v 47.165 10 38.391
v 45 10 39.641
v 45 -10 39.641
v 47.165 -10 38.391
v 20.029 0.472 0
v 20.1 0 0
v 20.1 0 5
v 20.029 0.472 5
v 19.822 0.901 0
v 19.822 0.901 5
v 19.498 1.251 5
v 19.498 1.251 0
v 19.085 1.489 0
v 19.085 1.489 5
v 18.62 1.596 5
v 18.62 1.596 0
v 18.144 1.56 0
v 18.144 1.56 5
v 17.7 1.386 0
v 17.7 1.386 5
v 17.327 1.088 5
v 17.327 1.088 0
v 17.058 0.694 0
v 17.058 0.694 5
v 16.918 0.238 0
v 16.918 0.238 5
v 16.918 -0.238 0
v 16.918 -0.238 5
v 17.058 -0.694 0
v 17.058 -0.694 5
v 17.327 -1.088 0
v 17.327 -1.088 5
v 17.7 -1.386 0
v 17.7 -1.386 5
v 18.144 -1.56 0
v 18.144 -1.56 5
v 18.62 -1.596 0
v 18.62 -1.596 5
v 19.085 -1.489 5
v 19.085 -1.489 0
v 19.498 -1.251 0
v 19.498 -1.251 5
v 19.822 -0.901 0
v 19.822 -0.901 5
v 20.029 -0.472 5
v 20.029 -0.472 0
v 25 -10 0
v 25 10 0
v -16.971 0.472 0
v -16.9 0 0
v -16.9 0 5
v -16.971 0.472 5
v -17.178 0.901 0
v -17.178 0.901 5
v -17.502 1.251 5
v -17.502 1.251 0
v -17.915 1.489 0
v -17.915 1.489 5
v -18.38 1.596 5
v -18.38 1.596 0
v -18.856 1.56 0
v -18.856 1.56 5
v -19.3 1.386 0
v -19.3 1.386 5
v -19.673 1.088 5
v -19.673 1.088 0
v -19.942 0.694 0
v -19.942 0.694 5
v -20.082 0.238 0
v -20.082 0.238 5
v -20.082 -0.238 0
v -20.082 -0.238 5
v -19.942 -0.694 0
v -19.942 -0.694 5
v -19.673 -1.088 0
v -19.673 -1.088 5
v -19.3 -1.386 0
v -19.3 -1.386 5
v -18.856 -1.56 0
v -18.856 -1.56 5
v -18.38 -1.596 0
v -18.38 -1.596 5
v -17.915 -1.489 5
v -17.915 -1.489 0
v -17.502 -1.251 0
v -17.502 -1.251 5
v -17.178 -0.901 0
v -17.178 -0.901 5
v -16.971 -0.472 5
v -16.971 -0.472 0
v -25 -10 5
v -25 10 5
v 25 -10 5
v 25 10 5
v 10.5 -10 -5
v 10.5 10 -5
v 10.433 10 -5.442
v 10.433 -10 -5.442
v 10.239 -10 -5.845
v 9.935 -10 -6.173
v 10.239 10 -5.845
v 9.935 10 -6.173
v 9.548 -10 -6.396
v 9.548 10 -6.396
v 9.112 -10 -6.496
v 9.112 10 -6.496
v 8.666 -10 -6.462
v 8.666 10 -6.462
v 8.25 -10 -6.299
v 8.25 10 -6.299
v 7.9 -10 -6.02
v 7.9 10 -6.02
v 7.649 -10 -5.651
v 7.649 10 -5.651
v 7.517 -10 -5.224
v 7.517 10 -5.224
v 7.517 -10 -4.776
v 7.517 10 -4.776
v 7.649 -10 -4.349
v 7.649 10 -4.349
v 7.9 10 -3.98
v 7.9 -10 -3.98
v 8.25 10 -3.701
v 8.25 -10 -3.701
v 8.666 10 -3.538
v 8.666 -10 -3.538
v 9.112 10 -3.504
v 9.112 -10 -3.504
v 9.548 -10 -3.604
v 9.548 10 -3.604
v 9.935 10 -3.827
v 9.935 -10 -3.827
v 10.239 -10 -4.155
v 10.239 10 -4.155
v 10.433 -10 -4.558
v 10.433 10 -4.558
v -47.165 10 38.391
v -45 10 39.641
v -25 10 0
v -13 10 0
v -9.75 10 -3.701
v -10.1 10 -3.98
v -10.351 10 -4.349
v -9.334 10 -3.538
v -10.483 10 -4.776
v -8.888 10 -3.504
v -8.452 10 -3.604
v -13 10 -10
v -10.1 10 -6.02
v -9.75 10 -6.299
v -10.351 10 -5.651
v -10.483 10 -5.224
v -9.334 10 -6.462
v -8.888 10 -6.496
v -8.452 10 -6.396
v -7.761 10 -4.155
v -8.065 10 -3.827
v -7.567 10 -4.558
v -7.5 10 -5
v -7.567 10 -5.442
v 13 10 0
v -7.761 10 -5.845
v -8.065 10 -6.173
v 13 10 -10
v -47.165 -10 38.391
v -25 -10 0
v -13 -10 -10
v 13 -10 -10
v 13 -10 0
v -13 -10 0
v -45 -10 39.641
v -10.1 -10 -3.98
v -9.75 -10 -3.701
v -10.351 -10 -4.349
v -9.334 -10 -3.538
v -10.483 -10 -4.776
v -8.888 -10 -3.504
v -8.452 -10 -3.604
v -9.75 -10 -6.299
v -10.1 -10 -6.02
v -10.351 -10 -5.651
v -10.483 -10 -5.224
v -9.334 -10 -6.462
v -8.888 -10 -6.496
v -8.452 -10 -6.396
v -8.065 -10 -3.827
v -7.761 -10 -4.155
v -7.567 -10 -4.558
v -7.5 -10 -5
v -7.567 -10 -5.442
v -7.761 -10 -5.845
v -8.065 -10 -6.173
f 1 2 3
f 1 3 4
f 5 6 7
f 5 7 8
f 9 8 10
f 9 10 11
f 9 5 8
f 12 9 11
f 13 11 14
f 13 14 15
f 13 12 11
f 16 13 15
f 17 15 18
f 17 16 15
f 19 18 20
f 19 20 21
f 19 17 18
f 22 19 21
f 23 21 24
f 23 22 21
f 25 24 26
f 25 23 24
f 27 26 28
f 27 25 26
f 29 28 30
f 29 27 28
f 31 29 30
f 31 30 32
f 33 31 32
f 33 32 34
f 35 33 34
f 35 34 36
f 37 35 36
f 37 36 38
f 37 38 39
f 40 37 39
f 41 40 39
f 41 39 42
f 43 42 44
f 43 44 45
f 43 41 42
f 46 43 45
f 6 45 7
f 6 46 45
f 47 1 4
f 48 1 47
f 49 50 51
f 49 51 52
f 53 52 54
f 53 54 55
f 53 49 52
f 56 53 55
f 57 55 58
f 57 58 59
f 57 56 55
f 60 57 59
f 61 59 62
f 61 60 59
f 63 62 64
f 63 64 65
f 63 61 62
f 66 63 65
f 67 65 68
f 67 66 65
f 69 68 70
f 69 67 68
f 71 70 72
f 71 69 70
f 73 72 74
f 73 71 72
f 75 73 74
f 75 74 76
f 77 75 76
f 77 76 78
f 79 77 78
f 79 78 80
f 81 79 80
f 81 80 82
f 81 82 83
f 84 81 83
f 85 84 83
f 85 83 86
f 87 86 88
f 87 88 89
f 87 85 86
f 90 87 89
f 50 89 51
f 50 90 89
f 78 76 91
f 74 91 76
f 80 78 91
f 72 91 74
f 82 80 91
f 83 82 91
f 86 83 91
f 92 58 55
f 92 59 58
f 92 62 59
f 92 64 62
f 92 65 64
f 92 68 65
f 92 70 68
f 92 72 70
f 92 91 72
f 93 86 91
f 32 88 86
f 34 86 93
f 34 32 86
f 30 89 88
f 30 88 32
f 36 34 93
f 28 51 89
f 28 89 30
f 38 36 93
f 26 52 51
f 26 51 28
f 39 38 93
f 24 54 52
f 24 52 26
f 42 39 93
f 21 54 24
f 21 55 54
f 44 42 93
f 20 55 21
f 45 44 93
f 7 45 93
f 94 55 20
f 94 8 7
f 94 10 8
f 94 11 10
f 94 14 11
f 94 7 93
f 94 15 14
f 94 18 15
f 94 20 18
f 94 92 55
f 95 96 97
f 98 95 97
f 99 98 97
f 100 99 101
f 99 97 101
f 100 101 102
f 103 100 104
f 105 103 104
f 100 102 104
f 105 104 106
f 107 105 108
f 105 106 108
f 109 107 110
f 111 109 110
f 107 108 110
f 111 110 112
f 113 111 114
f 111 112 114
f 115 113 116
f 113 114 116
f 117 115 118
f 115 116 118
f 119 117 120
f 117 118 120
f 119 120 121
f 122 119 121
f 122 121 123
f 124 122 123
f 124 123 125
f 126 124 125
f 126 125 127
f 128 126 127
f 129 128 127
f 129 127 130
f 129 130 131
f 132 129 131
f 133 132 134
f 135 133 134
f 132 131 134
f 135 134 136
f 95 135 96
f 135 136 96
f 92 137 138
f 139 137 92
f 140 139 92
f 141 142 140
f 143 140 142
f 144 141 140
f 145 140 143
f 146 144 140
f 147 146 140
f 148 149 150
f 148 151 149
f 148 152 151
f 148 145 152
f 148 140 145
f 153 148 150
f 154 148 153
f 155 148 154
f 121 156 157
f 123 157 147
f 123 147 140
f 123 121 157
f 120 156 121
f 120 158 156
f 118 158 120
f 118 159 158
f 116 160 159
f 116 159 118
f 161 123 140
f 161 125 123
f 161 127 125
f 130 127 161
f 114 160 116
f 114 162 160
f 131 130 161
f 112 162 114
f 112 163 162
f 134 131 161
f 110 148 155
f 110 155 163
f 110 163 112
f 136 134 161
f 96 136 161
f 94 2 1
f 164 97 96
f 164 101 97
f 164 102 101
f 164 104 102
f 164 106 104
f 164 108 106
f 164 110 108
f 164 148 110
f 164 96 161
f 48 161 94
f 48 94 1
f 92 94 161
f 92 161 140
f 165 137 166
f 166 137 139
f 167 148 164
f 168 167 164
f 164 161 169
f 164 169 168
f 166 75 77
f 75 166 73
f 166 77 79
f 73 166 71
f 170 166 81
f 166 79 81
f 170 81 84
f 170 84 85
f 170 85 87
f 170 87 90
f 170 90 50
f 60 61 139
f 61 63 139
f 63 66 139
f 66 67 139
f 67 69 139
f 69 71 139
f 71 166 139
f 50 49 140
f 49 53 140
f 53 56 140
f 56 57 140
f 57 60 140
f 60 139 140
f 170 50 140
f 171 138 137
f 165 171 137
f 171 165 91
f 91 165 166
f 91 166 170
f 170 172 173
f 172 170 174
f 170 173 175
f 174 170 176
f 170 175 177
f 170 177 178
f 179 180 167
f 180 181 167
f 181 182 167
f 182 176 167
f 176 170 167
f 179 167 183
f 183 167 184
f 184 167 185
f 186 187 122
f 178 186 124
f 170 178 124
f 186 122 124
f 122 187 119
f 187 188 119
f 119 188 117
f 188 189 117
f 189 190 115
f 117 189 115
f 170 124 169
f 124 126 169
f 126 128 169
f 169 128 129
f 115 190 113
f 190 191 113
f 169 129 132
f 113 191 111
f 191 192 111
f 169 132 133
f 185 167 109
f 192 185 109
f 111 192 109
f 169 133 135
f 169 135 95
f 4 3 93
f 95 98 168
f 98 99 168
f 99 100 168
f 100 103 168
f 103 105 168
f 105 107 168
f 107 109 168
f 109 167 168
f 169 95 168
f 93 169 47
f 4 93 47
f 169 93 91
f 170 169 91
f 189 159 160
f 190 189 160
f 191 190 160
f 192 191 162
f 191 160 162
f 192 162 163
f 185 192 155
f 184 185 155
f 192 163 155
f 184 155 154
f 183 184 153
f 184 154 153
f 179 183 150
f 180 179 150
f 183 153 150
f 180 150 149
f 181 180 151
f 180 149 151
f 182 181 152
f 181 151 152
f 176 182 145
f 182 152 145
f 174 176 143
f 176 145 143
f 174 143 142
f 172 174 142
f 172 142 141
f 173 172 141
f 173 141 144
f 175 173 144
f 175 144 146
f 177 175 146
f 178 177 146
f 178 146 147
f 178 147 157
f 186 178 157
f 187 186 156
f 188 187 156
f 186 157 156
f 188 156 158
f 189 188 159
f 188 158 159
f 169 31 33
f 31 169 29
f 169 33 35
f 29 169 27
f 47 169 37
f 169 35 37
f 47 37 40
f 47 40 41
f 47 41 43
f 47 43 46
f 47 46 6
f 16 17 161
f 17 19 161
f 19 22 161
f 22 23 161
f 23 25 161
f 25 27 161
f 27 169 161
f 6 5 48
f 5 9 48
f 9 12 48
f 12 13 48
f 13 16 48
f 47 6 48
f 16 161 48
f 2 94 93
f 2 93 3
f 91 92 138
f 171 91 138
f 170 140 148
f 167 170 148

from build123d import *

# Parameters (mm, degrees)
ESQUISSE1_W        = 50
ESQUISSE1_H        = 20
ESQUISSE1_R        = 1.6
BOSS_EXTRU_1_DEPTH = 5
ESQUISSE2_W        = 26
ESQUISSE2_H        = 10
ESQUISSE2_R        = 1.5
BOSS_EXTRU_2_DEPTH = 20


with BuildPart() as part:
    # Esquisse1 → Boss.-Extru.1 (new body)
    with BuildSketch(Plane.XY):
        Rectangle(ESQUISSE1_W, ESQUISSE1_H)
        with Locations((-18.5, 0)):
            Circle(ESQUISSE1_R, mode=Mode.SUBTRACT)
        with Locations((18.5, 0)):
            Circle(ESQUISSE1_R, mode=Mode.SUBTRACT)
    extrude(amount=BOSS_EXTRU_1_DEPTH)

    # Esquisse2 → Boss.-Extru.2 (add)
    with BuildSketch(Plane(origin=(0, 10, 0), x_dir=(1, 0, 0), z_dir=(0, 1, 0))):
        Polygon((25, 0), (25, -5), (45, -39.641016151), (47.165063509, -38.391016151), align=None)
        Polygon((-45, -39.641016151), (-47.165063509, -38.391016151), (-25, 0), (-25, -5), align=None)
        with Locations((0, 5)):
            Rectangle(ESQUISSE2_W, ESQUISSE2_H)
        with Locations((-9, 5)):
            Circle(ESQUISSE2_R, mode=Mode.SUBTRACT)
        with Locations((9, 5)):
            Circle(ESQUISSE2_R, mode=Mode.SUBTRACT)
    extrude(amount=-BOSS_EXTRU_2_DEPTH)


solid = part.part
